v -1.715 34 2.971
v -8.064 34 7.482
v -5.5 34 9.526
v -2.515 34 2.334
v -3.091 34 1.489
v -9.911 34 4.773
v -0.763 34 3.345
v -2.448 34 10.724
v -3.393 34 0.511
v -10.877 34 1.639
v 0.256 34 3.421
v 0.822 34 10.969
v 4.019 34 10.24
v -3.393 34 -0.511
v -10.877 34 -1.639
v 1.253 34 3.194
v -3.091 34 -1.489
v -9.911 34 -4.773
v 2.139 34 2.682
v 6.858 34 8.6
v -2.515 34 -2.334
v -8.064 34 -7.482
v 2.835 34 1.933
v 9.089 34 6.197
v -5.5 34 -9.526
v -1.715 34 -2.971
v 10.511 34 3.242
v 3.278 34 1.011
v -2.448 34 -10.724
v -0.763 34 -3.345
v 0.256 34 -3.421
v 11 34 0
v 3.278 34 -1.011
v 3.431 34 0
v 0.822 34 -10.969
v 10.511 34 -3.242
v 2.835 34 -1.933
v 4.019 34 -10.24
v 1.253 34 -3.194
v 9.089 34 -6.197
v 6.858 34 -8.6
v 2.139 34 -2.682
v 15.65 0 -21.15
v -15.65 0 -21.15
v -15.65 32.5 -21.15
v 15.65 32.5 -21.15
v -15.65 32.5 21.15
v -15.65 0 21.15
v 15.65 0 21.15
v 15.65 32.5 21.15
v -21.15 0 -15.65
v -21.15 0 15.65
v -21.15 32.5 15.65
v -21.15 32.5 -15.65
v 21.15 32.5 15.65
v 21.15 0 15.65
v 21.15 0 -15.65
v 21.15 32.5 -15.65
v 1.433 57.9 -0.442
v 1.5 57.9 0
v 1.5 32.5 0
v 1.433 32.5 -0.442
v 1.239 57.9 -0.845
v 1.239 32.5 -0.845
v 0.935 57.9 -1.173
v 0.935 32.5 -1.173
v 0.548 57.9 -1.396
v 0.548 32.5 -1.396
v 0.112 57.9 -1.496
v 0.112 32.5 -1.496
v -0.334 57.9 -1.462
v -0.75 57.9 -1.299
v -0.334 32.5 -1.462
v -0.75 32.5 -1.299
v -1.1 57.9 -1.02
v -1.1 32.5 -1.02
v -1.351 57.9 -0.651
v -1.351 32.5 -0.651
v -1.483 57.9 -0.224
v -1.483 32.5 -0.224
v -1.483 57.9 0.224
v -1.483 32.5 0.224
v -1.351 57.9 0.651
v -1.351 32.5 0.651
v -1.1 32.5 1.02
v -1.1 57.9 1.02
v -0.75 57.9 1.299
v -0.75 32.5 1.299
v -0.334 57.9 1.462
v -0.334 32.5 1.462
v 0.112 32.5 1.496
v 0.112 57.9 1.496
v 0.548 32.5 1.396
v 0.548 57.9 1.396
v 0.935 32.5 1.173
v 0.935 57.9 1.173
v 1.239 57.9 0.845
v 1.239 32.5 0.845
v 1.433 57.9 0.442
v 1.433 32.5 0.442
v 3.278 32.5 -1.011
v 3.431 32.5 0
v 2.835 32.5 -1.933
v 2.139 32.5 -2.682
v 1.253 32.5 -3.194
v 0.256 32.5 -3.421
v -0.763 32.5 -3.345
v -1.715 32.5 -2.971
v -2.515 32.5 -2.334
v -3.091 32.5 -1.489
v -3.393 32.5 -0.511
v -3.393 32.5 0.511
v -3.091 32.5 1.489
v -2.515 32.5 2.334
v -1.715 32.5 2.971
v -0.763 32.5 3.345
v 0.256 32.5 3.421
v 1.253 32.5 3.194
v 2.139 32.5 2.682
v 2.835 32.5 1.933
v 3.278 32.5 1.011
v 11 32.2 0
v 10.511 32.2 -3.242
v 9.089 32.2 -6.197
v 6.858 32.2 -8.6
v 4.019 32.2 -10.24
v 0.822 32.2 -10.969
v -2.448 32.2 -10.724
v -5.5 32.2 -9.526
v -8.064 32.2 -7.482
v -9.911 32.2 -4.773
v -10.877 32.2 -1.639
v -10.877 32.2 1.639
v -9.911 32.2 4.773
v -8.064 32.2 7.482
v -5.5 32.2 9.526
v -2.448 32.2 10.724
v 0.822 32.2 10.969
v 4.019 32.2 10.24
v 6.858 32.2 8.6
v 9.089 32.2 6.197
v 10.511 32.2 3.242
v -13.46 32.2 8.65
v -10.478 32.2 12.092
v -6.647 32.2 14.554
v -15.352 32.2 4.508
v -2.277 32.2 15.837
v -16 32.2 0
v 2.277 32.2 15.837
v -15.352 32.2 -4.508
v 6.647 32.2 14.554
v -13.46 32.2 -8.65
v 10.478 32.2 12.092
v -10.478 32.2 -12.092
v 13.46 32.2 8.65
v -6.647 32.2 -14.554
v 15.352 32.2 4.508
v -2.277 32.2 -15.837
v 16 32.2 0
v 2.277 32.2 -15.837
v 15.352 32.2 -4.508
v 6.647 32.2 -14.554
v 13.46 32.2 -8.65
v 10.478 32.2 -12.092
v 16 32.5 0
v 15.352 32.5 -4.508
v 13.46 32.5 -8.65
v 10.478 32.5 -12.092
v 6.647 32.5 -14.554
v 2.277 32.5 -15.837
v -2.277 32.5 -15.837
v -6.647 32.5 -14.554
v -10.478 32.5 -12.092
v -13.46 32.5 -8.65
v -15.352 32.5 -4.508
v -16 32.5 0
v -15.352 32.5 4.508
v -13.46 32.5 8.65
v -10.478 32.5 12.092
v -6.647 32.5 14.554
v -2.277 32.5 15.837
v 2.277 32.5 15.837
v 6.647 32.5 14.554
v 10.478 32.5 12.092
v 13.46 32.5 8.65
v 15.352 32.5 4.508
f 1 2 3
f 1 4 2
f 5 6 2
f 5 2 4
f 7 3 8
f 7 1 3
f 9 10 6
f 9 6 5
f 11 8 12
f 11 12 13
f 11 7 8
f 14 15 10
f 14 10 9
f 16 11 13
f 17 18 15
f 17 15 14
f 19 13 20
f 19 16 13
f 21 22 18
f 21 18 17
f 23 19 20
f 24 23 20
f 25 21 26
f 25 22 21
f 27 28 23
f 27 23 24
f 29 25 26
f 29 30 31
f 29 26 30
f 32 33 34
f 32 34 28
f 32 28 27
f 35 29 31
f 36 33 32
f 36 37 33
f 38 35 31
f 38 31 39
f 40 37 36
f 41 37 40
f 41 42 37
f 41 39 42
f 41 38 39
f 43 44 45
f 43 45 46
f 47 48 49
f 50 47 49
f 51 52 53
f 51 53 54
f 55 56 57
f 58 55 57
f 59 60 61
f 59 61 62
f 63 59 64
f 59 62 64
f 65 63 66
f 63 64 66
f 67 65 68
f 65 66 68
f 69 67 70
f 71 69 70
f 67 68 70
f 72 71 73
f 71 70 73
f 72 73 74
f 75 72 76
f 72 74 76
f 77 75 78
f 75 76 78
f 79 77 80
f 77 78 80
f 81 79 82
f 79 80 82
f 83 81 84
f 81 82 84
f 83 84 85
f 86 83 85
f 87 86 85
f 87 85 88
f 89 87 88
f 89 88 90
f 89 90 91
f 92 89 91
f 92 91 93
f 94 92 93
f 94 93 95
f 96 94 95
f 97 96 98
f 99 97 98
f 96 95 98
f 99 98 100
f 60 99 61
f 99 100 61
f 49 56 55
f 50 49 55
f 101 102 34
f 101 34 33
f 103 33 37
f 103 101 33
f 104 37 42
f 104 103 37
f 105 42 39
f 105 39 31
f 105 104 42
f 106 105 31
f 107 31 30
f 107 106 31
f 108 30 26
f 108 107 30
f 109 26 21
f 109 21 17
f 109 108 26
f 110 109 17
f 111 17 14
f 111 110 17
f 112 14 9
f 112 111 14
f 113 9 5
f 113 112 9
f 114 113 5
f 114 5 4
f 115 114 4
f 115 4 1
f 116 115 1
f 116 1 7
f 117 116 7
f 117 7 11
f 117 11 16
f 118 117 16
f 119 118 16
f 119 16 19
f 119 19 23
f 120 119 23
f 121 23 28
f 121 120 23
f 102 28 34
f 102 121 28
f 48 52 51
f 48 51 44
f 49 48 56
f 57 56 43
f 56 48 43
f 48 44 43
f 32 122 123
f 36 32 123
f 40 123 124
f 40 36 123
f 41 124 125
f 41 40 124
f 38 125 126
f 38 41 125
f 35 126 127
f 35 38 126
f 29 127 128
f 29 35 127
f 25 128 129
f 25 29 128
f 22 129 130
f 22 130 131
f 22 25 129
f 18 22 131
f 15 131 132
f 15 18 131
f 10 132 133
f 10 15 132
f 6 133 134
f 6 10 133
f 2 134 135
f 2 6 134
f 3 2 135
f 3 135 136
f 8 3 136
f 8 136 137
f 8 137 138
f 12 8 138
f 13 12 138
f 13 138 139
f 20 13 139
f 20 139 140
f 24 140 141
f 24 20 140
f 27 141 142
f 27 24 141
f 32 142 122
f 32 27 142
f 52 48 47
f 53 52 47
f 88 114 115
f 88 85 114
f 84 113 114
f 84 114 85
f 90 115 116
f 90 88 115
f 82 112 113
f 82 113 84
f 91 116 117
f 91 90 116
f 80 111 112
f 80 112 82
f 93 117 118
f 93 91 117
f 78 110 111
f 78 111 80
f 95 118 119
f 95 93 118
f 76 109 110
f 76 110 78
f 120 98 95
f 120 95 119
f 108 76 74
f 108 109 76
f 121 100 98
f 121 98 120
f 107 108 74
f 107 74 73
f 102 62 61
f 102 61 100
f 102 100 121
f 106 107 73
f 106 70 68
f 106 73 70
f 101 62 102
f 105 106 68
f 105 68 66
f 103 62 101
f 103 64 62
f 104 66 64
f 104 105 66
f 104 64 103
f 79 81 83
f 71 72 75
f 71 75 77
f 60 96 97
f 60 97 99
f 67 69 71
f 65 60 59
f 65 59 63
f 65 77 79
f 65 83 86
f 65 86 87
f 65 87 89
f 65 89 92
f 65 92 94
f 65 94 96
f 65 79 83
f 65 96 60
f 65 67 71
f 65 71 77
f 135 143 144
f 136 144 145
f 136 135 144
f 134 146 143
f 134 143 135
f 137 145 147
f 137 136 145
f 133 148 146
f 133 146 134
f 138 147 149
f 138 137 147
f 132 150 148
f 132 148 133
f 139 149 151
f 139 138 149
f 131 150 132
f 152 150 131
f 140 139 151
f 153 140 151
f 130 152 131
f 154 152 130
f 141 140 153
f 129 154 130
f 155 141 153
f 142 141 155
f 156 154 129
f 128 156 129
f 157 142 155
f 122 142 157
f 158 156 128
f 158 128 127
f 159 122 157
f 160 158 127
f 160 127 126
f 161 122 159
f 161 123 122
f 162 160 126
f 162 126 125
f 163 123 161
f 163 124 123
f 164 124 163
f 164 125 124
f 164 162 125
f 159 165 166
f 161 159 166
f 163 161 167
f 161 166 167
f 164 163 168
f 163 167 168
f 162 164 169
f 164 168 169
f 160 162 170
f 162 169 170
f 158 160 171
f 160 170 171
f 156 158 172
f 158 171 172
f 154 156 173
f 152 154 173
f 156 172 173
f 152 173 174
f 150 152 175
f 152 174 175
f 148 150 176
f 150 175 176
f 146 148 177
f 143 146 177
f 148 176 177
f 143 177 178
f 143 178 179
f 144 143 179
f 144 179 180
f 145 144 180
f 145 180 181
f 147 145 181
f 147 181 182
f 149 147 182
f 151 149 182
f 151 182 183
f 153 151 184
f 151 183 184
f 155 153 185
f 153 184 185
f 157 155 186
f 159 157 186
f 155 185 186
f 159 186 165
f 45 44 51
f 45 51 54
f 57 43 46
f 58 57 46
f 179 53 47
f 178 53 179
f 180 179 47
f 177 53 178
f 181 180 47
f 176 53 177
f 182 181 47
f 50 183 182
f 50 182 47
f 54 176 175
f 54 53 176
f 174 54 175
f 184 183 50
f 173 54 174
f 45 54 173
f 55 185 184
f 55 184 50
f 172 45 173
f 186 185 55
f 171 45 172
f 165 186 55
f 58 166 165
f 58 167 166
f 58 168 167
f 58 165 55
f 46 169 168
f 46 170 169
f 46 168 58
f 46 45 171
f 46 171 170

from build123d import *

# Parameters (mm, degrees)
SKETCH2_W           = 42.3
SKETCH2_H           = 42.3
BOSS_EXTRUDE1_DEPTH = 32.5
CHAMFER1_SIZE       = 5.5
SKETCH3_R           = 11
SKETCH3_R_2         = 3.430858596
BOSS_EXTRUDE2_DEPTH = 1.5
SKETCH4_R           = 16
SKETCH4_R_2         = 11
CUT_EXTRUDE1_DEPTH  = 0.3
SKETCH5_R           = 1.5
BOSS_EXTRUDE3_DEPTH = 25.4


with BuildPart() as part:
    # Sketch2 → Boss-Extrude1 (new body)
    with BuildSketch(Plane(origin=(0, 0, 0), x_dir=(1, 0, 0), z_dir=(0, 1, 0))):
        Rectangle(SKETCH2_W, SKETCH2_H)
    extrude(amount=BOSS_EXTRUDE1_DEPTH)

    # Chamfer1
    chamfer1_edges = [part.edges().sort_by_distance(p)[0] for p in [
        (21.15, 16.25, 21.15),
        (-21.15, 16.25, 21.15),
        (-21.15, 16.25, -21.15),
        (21.15, 16.25, -21.15),
    ]]
    chamfer(chamfer1_edges, length=CHAMFER1_SIZE)

    # Sketch3 → Boss-Extrude2 (add)
    with BuildSketch(Plane(origin=(0, 32.5, 0), x_dir=(1, 0, 0), z_dir=(0, 1, 0))):
        Circle(SKETCH3_R)
        Circle(SKETCH3_R_2, mode=Mode.SUBTRACT)
    extrude(amount=BOSS_EXTRUDE2_DEPTH)

    # Sketch4 → Cut-Extrude1 (cut)
    with BuildSketch(Plane(origin=(0, 32.5, 0), x_dir=(1, 0, 0), z_dir=(0, 1, 0))):
        Circle(SKETCH4_R)
        Circle(SKETCH4_R_2, mode=Mode.SUBTRACT)
    extrude(amount=-CUT_EXTRUDE1_DEPTH, mode=Mode.SUBTRACT)

    # Sketch5 → Boss-Extrude3 (add)
    with BuildSketch(Plane(origin=(0, 32.5, 0), x_dir=(1, 0, 0), z_dir=(0, 1, 0))):
        Circle(SKETCH5_R)
    extrude(amount=BOSS_EXTRUDE3_DEPTH)


solid = part.part
